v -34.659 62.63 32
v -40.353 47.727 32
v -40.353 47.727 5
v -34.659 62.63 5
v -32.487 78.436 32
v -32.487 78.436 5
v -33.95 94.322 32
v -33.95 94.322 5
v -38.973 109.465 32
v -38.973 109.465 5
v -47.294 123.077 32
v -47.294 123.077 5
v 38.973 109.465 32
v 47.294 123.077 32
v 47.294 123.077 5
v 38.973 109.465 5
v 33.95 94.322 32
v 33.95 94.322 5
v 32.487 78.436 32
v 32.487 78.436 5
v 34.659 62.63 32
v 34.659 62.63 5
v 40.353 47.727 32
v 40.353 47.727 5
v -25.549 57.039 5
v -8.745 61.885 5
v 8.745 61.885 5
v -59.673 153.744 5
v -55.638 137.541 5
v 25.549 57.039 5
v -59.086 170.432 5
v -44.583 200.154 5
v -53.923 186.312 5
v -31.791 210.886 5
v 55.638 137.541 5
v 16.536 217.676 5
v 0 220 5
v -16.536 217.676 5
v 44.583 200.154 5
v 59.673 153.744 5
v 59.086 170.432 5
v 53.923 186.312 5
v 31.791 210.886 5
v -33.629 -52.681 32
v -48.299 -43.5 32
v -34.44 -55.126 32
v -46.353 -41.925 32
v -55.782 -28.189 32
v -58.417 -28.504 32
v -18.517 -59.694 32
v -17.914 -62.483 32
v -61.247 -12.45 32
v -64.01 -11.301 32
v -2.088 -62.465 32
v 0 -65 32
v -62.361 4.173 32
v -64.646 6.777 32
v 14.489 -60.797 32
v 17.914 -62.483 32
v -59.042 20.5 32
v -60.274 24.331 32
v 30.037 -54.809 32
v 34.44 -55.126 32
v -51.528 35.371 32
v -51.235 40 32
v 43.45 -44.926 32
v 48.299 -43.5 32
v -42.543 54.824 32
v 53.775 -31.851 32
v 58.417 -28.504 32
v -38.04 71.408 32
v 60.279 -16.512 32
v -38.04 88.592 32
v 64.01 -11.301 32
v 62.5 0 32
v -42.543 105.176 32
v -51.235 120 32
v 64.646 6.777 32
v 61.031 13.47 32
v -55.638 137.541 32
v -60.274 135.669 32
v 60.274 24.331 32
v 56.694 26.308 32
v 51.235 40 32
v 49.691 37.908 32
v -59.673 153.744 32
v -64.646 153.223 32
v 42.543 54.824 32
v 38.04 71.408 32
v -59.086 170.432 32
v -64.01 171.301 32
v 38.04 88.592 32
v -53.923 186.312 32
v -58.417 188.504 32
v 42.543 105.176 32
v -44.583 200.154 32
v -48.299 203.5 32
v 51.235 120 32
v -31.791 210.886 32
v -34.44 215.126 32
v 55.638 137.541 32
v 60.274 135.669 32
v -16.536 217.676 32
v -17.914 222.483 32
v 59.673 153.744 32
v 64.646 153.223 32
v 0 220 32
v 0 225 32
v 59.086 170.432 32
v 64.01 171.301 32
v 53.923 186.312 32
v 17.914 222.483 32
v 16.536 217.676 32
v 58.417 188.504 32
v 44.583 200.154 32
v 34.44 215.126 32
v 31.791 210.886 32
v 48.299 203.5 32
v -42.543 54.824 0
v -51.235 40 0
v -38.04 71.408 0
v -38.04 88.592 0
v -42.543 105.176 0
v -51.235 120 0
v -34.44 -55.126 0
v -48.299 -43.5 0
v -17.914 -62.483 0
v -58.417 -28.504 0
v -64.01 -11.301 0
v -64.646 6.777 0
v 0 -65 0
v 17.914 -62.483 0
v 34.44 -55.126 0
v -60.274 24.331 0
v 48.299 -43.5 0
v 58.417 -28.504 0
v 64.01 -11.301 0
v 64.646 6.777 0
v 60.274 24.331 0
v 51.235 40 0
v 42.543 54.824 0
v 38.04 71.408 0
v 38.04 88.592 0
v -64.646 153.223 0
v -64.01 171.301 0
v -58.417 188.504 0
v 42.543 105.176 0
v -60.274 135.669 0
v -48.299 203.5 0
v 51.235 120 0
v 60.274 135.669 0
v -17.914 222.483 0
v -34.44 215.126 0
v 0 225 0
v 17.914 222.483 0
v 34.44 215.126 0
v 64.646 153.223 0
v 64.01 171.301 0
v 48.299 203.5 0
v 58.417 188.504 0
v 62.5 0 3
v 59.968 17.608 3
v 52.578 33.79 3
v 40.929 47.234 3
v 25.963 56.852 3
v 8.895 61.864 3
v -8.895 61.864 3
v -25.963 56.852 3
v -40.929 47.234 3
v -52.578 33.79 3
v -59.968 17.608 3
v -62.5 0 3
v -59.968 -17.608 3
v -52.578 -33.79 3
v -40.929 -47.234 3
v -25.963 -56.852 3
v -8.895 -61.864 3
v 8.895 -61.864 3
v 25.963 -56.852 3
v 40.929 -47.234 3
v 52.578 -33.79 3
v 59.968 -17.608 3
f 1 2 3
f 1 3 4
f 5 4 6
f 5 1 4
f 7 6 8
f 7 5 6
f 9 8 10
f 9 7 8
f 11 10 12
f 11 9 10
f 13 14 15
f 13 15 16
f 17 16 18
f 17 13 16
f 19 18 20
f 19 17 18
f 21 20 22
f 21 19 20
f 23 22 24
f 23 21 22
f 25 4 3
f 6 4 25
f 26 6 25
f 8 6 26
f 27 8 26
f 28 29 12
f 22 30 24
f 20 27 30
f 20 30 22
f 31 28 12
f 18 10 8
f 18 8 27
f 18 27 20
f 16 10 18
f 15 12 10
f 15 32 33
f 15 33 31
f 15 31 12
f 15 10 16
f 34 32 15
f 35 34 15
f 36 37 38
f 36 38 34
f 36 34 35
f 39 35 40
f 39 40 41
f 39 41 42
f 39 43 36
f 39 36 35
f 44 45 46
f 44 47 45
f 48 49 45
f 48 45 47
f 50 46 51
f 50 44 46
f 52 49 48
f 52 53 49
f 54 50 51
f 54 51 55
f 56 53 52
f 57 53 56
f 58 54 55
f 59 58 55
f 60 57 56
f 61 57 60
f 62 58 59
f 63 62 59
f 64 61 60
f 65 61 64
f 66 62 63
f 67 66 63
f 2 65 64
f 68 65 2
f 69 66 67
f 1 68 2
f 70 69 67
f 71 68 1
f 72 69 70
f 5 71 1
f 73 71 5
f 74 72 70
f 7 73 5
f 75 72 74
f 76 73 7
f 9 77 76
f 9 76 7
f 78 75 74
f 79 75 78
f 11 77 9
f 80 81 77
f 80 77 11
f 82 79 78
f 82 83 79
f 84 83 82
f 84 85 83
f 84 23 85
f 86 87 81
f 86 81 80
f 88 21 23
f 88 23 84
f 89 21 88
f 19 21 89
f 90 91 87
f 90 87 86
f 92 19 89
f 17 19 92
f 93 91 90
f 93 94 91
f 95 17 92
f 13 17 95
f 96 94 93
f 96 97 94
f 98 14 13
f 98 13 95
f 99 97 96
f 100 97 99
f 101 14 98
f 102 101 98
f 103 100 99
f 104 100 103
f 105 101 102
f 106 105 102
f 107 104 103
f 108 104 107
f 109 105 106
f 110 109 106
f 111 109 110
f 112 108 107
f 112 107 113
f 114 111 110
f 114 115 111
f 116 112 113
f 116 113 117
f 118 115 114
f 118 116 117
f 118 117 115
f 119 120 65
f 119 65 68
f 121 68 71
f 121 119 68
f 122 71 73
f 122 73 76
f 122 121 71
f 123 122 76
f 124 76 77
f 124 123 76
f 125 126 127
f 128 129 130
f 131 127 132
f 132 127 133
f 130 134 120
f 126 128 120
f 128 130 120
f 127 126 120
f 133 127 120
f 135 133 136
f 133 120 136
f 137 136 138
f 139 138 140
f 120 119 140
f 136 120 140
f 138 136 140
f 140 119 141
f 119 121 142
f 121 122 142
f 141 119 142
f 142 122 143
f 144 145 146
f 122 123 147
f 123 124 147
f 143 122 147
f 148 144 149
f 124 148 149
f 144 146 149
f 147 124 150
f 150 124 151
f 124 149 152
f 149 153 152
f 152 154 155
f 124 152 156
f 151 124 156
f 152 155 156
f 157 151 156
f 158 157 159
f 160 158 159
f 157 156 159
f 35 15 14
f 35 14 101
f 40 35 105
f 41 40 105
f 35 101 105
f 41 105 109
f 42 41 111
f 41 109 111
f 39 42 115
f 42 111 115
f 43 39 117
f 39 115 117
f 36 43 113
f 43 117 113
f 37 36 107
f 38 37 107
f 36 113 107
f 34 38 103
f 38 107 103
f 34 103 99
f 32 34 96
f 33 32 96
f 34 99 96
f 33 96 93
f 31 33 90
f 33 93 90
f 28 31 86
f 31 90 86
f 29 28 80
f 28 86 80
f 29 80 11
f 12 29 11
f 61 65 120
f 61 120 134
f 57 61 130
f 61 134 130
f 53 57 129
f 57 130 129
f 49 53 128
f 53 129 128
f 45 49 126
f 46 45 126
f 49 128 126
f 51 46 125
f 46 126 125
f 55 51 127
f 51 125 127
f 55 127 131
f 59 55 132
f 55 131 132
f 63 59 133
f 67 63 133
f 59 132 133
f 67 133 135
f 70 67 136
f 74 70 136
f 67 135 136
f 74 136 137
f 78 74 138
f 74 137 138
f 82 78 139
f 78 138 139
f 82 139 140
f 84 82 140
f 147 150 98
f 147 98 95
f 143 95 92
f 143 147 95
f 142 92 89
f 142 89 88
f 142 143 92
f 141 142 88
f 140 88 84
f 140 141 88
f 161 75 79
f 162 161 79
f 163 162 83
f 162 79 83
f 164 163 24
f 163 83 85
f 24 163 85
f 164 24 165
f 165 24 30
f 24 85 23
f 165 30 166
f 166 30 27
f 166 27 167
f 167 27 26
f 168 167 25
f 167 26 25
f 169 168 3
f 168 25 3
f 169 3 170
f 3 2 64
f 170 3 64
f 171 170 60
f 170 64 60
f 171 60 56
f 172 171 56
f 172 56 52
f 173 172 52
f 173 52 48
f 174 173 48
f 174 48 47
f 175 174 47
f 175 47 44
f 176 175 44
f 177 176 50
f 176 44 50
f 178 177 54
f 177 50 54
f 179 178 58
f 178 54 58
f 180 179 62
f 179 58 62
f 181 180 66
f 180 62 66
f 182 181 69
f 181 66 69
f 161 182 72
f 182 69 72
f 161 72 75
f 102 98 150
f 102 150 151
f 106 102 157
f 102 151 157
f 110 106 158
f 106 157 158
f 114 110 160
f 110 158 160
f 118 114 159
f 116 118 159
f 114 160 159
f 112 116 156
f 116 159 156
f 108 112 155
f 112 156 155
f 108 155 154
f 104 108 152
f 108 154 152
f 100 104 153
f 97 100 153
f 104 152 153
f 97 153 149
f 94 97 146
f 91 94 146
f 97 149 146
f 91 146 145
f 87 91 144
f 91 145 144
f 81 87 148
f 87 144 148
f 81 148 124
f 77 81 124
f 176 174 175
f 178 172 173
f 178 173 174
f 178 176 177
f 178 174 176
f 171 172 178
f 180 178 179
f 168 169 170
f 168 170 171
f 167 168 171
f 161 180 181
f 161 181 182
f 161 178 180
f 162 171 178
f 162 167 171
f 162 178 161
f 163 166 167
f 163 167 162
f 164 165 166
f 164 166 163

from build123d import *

# Parameters (mm, degrees)
PAD_DEPTH       = 32
POCKET_DEPTH    = 27
SKETCH021_R     = 62.5
POCKET014_DEPTH = 29


with BuildPart() as part:
    # Sketch → Pad (new body)
    with BuildSketch(Plane.XY):
        with BuildLine():
            ThreePointArc((-51.234754, 40), (0, -65), (51.234754, 40))
            ThreePointArc((51.234754, 120), (37.469508, 80), (51.234754, 40))
            ThreePointArc((51.234754, 120), (0, 225), (-51.234754, 120))
            ThreePointArc((-51.234754, 40), (-37.469508, 80), (-51.234754, 120))
        make_face()
    extrude(amount=PAD_DEPTH)

    # Sketch001 (on Face6 of Pad) → Pocket (cut)
    with BuildSketch(Plane.XY.offset(32)):
        with BuildLine():
            ThreePointArc((-47.293673, 36.923008), (4.4e-05, -60), (47.293619, 36.923077))
            ThreePointArc((47.293619, 123.076923), (32.469508, 80), (47.293619, 36.923077))
            ThreePointArc((47.293619, 123.076923), (0, 220), (-47.293619, 123.076923))
            ThreePointArc((-47.293673, 36.923008), (-32.469508, 79.999956), (-47.293619, 123.076923))
        make_face()
    extrude(amount=-POCKET_DEPTH, mode=Mode.SUBTRACT)

    # Sketch021 (on Face5 of Pocket) → Pocket014 (cut)
    with BuildSketch(Plane.XY.offset(32)):
        Circle(SKETCH021_R)
    extrude(amount=-POCKET014_DEPTH, mode=Mode.SUBTRACT)


solid = part.part
